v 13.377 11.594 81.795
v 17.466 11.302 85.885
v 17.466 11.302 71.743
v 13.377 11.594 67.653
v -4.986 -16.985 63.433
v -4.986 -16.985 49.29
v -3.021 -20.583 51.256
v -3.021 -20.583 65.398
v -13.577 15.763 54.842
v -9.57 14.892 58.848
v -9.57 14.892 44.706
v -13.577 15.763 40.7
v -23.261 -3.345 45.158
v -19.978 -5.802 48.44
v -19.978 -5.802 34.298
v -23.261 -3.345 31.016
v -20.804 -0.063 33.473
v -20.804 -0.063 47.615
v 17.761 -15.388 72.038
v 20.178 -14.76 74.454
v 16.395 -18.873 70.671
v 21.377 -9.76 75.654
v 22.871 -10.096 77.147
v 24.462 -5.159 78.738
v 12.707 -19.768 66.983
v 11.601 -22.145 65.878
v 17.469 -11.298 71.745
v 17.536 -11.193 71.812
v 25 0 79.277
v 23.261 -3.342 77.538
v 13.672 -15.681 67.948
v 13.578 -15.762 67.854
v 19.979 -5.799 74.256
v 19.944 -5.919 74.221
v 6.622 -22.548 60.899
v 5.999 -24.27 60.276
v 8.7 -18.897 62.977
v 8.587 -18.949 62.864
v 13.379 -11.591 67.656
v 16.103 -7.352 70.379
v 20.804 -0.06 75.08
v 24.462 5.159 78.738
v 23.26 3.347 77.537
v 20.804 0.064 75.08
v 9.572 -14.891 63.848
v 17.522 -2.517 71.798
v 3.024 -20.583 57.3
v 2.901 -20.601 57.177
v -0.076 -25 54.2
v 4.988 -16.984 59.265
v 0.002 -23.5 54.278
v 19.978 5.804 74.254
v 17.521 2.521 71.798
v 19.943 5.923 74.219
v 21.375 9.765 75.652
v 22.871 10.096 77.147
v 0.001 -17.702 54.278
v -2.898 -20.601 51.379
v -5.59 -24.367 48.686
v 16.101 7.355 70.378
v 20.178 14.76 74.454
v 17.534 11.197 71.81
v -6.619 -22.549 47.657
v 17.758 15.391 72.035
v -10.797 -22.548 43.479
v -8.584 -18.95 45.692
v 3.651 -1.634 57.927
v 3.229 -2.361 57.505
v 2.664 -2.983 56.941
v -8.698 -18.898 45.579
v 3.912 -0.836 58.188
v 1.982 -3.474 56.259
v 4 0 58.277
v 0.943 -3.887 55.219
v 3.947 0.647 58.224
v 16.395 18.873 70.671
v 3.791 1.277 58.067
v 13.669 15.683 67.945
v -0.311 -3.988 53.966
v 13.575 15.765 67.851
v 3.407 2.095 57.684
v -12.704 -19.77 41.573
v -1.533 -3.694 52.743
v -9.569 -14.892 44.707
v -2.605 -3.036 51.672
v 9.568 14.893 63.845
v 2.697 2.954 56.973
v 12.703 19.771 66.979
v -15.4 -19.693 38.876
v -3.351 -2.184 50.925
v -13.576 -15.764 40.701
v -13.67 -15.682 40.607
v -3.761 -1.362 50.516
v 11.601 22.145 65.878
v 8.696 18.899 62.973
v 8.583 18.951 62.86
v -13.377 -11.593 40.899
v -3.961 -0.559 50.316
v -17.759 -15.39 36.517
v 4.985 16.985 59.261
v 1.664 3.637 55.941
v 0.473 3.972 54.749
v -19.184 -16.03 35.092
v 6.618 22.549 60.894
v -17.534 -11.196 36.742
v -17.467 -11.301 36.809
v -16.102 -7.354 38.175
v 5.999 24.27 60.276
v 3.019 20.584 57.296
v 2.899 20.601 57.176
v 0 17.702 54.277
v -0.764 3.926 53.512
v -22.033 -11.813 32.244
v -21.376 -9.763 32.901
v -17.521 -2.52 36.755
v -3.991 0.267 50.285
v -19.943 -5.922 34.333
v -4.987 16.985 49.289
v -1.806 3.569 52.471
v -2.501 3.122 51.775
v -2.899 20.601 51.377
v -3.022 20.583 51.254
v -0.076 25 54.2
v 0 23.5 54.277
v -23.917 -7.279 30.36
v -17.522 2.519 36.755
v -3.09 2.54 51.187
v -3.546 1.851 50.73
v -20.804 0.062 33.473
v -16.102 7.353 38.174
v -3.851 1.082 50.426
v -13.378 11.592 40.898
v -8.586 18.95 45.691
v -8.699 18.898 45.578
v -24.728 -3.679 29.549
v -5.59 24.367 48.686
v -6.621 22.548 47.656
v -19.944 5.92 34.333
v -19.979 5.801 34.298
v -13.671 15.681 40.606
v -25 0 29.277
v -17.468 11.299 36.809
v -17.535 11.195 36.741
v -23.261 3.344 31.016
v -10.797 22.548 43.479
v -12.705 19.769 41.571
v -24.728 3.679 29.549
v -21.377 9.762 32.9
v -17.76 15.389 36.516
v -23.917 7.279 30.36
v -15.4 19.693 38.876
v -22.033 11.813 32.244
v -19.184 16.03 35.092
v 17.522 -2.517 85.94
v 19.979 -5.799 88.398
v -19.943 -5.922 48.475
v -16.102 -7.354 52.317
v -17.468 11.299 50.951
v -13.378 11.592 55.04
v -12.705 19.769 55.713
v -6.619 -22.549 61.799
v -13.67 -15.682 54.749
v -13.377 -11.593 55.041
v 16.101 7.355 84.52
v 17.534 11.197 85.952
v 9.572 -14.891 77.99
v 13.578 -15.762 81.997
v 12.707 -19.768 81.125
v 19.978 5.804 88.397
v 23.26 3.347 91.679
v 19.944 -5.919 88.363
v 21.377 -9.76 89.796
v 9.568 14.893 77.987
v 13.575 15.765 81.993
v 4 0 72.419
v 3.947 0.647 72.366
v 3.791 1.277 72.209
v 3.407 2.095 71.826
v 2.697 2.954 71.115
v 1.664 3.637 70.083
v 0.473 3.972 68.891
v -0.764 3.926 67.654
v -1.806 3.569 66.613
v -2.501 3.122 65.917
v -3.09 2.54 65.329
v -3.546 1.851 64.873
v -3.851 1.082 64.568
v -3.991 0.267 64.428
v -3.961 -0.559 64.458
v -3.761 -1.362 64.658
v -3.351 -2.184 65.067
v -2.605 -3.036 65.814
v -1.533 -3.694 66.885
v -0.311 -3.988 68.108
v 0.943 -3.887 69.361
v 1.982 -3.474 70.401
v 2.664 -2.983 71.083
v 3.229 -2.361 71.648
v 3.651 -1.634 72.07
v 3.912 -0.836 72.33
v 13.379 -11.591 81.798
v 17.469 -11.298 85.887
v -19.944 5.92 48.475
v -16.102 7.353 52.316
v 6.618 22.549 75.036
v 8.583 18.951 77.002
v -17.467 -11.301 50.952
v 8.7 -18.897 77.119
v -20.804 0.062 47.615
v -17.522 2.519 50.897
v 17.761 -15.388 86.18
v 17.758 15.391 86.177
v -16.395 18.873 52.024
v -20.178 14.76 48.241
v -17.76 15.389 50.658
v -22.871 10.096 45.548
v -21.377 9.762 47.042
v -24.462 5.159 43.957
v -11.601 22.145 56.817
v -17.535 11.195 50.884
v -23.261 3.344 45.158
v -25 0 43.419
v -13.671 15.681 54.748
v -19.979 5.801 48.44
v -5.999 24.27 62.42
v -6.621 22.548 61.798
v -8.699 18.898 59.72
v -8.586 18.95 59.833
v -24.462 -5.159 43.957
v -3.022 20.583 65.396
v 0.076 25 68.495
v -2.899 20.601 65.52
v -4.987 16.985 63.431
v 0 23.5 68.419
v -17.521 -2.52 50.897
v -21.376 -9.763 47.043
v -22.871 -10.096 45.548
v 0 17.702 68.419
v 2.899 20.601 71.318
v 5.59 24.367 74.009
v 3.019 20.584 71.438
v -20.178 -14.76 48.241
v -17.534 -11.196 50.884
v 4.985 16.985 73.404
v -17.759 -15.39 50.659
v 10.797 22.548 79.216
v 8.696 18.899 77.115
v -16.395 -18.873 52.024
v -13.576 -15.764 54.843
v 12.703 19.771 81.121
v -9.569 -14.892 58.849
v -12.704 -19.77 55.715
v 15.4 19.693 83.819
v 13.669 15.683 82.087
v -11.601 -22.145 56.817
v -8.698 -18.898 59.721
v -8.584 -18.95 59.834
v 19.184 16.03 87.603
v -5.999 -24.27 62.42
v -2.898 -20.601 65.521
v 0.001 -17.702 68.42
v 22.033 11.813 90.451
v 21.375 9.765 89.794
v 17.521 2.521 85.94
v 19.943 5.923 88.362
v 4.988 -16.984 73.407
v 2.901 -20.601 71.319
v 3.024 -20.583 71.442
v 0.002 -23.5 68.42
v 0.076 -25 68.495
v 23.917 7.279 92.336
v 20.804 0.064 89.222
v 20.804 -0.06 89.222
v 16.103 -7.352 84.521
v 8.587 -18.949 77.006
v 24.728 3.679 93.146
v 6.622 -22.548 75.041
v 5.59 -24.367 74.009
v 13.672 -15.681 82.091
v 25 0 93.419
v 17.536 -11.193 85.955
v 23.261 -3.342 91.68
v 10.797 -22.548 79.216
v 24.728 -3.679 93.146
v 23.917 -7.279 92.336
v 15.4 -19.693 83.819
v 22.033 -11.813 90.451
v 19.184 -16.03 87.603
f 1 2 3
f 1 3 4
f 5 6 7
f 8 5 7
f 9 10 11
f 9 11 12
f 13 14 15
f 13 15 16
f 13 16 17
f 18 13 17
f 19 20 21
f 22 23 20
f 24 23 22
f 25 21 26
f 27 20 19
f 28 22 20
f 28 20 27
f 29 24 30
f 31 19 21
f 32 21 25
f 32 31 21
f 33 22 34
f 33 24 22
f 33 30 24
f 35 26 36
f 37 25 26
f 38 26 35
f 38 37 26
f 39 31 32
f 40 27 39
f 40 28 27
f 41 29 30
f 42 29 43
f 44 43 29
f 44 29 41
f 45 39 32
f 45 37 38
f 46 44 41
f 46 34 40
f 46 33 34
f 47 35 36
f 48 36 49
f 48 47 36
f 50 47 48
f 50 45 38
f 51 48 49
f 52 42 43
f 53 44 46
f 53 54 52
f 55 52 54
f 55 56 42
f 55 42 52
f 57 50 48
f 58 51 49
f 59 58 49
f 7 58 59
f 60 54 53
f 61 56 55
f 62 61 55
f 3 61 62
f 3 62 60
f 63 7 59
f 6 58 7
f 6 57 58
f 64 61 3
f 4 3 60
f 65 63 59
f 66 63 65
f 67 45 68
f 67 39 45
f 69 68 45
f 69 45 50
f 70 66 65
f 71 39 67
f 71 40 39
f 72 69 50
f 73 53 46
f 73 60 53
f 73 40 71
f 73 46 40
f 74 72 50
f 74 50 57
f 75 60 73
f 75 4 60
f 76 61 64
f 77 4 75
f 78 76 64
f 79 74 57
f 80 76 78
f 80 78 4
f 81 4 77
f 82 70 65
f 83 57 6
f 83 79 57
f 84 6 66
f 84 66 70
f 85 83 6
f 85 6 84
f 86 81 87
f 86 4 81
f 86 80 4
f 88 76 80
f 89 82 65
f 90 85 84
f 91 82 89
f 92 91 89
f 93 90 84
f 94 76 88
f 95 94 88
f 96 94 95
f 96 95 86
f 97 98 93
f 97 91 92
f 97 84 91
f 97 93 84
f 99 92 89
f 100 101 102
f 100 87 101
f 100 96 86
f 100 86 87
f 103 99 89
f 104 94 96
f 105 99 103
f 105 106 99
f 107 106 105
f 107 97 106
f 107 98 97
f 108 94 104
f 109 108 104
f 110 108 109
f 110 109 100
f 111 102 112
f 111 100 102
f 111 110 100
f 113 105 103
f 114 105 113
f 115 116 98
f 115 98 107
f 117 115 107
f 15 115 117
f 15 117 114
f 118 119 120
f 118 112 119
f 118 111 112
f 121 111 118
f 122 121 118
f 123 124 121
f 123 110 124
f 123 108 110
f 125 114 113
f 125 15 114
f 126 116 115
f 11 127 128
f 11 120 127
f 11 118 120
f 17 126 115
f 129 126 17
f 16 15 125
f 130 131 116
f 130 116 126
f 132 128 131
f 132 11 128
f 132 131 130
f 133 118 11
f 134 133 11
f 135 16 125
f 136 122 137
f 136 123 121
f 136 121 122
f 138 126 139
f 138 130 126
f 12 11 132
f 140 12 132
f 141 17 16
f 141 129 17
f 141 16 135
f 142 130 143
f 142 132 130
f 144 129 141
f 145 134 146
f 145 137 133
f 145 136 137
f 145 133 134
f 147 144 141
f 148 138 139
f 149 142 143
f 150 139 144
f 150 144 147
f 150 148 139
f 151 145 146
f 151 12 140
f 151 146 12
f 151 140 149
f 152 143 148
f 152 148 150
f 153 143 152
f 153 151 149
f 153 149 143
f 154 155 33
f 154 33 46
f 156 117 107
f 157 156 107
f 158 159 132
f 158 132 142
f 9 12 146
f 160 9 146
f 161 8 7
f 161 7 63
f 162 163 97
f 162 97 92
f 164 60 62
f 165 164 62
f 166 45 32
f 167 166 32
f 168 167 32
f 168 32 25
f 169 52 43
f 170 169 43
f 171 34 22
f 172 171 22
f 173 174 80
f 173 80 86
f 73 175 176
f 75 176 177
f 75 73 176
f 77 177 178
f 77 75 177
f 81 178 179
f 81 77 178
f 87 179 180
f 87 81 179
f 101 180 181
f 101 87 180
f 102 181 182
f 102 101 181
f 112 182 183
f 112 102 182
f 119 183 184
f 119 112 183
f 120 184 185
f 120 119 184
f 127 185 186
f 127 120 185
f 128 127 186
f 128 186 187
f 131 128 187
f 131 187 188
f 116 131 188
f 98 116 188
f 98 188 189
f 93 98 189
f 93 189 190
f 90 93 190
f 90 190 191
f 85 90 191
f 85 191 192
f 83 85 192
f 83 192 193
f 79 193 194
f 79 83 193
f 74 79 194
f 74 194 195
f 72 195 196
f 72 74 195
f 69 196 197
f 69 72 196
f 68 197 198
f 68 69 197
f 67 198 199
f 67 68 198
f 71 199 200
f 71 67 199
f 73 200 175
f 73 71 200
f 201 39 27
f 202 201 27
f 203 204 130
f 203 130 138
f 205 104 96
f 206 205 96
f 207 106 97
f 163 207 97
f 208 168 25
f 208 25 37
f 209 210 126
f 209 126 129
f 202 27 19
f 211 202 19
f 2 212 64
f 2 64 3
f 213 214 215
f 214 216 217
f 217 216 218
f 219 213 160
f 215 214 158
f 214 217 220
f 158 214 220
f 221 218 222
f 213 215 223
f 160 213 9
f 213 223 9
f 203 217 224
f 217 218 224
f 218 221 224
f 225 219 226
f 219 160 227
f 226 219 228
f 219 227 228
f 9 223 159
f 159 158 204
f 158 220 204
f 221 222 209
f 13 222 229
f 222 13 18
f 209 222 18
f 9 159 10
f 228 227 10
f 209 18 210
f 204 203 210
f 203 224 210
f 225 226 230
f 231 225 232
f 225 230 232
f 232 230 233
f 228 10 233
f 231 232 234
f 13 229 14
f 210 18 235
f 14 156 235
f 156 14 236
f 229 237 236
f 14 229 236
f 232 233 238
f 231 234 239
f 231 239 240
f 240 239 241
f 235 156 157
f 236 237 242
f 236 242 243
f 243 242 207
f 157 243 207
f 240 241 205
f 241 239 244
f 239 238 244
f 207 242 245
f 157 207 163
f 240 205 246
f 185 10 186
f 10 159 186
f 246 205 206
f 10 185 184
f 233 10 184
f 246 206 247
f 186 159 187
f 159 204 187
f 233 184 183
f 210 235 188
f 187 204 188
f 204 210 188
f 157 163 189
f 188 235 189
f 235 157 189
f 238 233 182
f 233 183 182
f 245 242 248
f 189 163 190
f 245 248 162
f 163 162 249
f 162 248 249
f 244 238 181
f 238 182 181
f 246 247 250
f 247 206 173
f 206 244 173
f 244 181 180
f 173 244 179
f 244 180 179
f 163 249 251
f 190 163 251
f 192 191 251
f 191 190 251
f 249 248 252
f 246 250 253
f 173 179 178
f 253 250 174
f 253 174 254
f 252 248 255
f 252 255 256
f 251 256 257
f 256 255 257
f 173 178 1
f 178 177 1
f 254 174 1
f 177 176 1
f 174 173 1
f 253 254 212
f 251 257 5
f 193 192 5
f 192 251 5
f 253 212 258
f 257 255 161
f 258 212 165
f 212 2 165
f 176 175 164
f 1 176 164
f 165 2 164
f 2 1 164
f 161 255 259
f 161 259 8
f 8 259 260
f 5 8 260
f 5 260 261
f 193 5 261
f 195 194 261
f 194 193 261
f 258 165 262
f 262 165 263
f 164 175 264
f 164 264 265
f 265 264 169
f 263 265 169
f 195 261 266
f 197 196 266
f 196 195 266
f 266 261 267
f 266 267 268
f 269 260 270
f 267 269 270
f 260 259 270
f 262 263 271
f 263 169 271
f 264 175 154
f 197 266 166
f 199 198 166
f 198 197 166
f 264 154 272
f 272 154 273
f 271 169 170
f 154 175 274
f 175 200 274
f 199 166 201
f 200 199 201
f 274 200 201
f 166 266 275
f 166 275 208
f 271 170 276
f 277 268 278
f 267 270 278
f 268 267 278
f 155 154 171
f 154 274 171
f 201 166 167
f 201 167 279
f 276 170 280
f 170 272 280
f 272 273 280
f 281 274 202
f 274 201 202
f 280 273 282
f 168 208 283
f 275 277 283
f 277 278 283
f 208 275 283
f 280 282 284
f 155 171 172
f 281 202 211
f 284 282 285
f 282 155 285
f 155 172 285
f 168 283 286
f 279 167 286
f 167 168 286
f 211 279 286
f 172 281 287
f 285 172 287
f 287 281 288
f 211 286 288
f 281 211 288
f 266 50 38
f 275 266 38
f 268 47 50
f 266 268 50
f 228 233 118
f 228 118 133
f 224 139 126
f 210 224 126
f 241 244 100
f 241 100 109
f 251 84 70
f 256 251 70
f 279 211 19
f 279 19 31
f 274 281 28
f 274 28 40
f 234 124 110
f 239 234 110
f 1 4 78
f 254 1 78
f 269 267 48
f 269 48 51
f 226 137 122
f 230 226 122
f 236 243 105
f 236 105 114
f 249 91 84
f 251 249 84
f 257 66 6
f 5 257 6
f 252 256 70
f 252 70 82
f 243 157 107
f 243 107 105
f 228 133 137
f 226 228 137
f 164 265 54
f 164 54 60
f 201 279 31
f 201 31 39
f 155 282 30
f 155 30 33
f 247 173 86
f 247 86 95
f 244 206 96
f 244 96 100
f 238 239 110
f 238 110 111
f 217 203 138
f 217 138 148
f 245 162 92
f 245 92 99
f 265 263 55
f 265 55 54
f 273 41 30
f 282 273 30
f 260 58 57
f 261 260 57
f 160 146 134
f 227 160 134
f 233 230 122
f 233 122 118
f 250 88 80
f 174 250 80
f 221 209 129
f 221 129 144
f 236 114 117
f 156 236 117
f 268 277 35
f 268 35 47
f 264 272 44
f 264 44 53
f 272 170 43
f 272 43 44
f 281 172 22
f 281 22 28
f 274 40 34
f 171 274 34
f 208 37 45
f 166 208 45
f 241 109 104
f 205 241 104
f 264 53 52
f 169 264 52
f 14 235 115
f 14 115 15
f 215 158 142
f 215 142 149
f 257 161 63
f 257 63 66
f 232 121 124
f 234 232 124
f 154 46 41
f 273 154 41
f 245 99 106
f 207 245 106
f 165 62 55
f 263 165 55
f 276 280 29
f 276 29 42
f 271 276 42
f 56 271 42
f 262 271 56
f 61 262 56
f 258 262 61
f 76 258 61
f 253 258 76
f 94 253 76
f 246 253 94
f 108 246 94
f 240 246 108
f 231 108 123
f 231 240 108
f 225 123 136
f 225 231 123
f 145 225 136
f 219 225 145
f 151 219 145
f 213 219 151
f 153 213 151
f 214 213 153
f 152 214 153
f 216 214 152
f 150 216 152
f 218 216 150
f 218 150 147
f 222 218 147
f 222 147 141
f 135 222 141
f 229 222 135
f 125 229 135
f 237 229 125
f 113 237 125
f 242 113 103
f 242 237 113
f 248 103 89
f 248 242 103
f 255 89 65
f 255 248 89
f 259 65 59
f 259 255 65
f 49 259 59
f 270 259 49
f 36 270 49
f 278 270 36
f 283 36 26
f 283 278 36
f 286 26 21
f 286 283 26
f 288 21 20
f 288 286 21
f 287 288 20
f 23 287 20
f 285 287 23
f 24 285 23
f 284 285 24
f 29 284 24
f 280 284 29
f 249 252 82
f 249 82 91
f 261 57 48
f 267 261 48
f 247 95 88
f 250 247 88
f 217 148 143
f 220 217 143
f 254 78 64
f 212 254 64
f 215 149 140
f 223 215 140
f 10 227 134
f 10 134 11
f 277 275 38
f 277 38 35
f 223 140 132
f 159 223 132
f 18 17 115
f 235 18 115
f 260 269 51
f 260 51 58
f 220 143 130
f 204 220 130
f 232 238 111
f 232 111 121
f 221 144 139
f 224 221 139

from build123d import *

# Parameters (mm, degrees)
F0_R          = 25
F1_DEPTH      = 140
F1_DEPTH_BACK = 140
F3_DEPTH      = 70
F3_DEPTH_BACK = 70
F4_R          = 4
F5_DEPTH      = 100


with BuildPart() as f1:
    # F0 (on Top) → F1 (new body, two sides)
    with BuildSketch(Plane.XY) as f1_sk:
        Circle(F0_R)
        Polygon((-17.759334, -15.390129), (-17.467051, -11.30056), (-13.377482, -11.592843), (-13.669765, -15.682412), align=None, mode=Mode.SUBTRACT)
        Polygon((-4.986074, -16.984997), (-3.020925, -20.583356), (-6.619284, -22.548505), (-8.584433, -18.950146), align=None, mode=Mode.SUBTRACT)
        Polygon((-12.70393, -19.770184), (-13.575676, -15.763931), (-9.569424, -14.892185), (-8.697678, -18.898437), align=None, mode=Mode.SUBTRACT)
        Polygon((-16.101728, -7.354277), (-17.534361, -11.195835), (-21.375918, -9.763202), (-19.943286, -5.921645), align=None, mode=Mode.SUBTRACT)
        Polygon((-17.52145, -2.519885), (-19.978364, -5.802198), (-23.260677, -3.345284), (-20.803763, -0.062972), align=None, mode=Mode.SUBTRACT)
        Polygon((2.900576, -20.60066), (0.001641, -23.5), (-2.8977, -20.601065), (0.001236, -17.701724), align=None, mode=Mode.SUBTRACT)
        Polygon((8.587079, -18.948947), (6.622432, -22.547581), (3.023799, -20.582934), (4.988446, -16.9843), align=None, mode=Mode.SUBTRACT)
        Polygon((12.70669, -19.76841), (8.700316, -18.897223), (9.571503, -14.890849), (13.577877, -15.762036), align=None, mode=Mode.SUBTRACT)
        Polygon((13.379101, -11.590975), (17.468628, -11.298121), (17.761482, -15.387649), (13.671955, -15.680503), align=None, mode=Mode.SUBTRACT)
        Polygon((21.377281, -9.760218), (17.535924, -11.193387), (16.102755, -7.352029), (19.944112, -5.91886), align=None, mode=Mode.SUBTRACT)
        Polygon((19.979174, -5.799408), (17.521802, -2.517439), (20.803772, -0.060067), (23.261143, -3.342037), align=None, mode=Mode.SUBTRACT)
        Polygon((-23.26091, 3.343661), (-19.978769, 5.800803), (-17.521626, 2.518662), (-20.803767, 0.061519), align=None, mode=Mode.SUBTRACT)
        Polygon((-19.943699, 5.920253), (-21.3766, 9.76171), (-17.535142, 11.194611), (-16.102242, 7.353153), align=None, mode=Mode.SUBTRACT)
        Polygon((-13.67086, 15.681458), (-13.378291, 11.59191), (-17.467839, 11.299341), (-17.760408, 15.388889), align=None, mode=Mode.SUBTRACT)
        Polygon((-9.570464, 14.891517), (-13.576777, 15.762984), (-12.70531, 19.769297), (-8.698997, 18.89783), align=None, mode=Mode.SUBTRACT)
        Polygon((-8.585756, 18.949547), (-6.620858, 22.548043), (-3.022362, 20.583145), (-4.98726, 16.984649), align=None, mode=Mode.SUBTRACT)
        Polygon((19.977959, 5.803593), (23.260443, 3.346908), (20.803759, 0.064424), (17.521274, 2.521108), align=None, mode=Mode.SUBTRACT)
        Polygon((21.375237, 9.764695), (19.942872, 5.923037), (16.101215, 7.355402), (17.533579, 11.197059), align=None, mode=Mode.SUBTRACT)
        Polygon((12.70255, 19.771071), (13.574576, 15.764879), (9.568384, 14.892853), (8.696358, 18.899044), align=None, mode=Mode.SUBTRACT)
        Polygon((-0.00164, 23.49836), (0, 23.5), (2.899138, 20.600862), (0, 17.701724), (-0.001236, 17.70296), (-2.899138, 20.600862), align=None, mode=Mode.SUBTRACT)
        Polygon((6.61771, 22.548967), (8.58311, 18.950745), (4.984888, 16.985345), (3.019488, 20.583567), align=None, mode=Mode.SUBTRACT)
        Polygon((13.376673, 11.593777), (13.66867, 15.683366), (17.758259, 15.391369), (17.466262, 11.30178), align=None, mode=Mode.SUBTRACT)
    extrude(amount=F1_DEPTH)
    extrude(f1_sk.sketch, amount=-F1_DEPTH_BACK)

    # F2 (on Front) → F3 (cut, two sides)
    with BuildSketch(Plane.XZ) as f3_sk:
        Polygon((98.642283, 152.918806), (-61.347591, -7.071068), (-72.7507, -18.474177), (-63.999477, -174.67025), (77.080854, -174.67025), align=None)
        Polygon((-70.218705, 159.989874), (-68.418659, 0), (91.571215, 159.989874), align=None)
    extrude(amount=F3_DEPTH, mode=Mode.SUBTRACT)
    extrude(f3_sk.sketch, amount=-F3_DEPTH_BACK, mode=Mode.SUBTRACT)

    # F4 (on Top) → F5 (cut)
    with BuildSketch(Plane.XY):
        Circle(F4_R)
    extrude(amount=F5_DEPTH, mode=Mode.SUBTRACT)


solid = f1.part
